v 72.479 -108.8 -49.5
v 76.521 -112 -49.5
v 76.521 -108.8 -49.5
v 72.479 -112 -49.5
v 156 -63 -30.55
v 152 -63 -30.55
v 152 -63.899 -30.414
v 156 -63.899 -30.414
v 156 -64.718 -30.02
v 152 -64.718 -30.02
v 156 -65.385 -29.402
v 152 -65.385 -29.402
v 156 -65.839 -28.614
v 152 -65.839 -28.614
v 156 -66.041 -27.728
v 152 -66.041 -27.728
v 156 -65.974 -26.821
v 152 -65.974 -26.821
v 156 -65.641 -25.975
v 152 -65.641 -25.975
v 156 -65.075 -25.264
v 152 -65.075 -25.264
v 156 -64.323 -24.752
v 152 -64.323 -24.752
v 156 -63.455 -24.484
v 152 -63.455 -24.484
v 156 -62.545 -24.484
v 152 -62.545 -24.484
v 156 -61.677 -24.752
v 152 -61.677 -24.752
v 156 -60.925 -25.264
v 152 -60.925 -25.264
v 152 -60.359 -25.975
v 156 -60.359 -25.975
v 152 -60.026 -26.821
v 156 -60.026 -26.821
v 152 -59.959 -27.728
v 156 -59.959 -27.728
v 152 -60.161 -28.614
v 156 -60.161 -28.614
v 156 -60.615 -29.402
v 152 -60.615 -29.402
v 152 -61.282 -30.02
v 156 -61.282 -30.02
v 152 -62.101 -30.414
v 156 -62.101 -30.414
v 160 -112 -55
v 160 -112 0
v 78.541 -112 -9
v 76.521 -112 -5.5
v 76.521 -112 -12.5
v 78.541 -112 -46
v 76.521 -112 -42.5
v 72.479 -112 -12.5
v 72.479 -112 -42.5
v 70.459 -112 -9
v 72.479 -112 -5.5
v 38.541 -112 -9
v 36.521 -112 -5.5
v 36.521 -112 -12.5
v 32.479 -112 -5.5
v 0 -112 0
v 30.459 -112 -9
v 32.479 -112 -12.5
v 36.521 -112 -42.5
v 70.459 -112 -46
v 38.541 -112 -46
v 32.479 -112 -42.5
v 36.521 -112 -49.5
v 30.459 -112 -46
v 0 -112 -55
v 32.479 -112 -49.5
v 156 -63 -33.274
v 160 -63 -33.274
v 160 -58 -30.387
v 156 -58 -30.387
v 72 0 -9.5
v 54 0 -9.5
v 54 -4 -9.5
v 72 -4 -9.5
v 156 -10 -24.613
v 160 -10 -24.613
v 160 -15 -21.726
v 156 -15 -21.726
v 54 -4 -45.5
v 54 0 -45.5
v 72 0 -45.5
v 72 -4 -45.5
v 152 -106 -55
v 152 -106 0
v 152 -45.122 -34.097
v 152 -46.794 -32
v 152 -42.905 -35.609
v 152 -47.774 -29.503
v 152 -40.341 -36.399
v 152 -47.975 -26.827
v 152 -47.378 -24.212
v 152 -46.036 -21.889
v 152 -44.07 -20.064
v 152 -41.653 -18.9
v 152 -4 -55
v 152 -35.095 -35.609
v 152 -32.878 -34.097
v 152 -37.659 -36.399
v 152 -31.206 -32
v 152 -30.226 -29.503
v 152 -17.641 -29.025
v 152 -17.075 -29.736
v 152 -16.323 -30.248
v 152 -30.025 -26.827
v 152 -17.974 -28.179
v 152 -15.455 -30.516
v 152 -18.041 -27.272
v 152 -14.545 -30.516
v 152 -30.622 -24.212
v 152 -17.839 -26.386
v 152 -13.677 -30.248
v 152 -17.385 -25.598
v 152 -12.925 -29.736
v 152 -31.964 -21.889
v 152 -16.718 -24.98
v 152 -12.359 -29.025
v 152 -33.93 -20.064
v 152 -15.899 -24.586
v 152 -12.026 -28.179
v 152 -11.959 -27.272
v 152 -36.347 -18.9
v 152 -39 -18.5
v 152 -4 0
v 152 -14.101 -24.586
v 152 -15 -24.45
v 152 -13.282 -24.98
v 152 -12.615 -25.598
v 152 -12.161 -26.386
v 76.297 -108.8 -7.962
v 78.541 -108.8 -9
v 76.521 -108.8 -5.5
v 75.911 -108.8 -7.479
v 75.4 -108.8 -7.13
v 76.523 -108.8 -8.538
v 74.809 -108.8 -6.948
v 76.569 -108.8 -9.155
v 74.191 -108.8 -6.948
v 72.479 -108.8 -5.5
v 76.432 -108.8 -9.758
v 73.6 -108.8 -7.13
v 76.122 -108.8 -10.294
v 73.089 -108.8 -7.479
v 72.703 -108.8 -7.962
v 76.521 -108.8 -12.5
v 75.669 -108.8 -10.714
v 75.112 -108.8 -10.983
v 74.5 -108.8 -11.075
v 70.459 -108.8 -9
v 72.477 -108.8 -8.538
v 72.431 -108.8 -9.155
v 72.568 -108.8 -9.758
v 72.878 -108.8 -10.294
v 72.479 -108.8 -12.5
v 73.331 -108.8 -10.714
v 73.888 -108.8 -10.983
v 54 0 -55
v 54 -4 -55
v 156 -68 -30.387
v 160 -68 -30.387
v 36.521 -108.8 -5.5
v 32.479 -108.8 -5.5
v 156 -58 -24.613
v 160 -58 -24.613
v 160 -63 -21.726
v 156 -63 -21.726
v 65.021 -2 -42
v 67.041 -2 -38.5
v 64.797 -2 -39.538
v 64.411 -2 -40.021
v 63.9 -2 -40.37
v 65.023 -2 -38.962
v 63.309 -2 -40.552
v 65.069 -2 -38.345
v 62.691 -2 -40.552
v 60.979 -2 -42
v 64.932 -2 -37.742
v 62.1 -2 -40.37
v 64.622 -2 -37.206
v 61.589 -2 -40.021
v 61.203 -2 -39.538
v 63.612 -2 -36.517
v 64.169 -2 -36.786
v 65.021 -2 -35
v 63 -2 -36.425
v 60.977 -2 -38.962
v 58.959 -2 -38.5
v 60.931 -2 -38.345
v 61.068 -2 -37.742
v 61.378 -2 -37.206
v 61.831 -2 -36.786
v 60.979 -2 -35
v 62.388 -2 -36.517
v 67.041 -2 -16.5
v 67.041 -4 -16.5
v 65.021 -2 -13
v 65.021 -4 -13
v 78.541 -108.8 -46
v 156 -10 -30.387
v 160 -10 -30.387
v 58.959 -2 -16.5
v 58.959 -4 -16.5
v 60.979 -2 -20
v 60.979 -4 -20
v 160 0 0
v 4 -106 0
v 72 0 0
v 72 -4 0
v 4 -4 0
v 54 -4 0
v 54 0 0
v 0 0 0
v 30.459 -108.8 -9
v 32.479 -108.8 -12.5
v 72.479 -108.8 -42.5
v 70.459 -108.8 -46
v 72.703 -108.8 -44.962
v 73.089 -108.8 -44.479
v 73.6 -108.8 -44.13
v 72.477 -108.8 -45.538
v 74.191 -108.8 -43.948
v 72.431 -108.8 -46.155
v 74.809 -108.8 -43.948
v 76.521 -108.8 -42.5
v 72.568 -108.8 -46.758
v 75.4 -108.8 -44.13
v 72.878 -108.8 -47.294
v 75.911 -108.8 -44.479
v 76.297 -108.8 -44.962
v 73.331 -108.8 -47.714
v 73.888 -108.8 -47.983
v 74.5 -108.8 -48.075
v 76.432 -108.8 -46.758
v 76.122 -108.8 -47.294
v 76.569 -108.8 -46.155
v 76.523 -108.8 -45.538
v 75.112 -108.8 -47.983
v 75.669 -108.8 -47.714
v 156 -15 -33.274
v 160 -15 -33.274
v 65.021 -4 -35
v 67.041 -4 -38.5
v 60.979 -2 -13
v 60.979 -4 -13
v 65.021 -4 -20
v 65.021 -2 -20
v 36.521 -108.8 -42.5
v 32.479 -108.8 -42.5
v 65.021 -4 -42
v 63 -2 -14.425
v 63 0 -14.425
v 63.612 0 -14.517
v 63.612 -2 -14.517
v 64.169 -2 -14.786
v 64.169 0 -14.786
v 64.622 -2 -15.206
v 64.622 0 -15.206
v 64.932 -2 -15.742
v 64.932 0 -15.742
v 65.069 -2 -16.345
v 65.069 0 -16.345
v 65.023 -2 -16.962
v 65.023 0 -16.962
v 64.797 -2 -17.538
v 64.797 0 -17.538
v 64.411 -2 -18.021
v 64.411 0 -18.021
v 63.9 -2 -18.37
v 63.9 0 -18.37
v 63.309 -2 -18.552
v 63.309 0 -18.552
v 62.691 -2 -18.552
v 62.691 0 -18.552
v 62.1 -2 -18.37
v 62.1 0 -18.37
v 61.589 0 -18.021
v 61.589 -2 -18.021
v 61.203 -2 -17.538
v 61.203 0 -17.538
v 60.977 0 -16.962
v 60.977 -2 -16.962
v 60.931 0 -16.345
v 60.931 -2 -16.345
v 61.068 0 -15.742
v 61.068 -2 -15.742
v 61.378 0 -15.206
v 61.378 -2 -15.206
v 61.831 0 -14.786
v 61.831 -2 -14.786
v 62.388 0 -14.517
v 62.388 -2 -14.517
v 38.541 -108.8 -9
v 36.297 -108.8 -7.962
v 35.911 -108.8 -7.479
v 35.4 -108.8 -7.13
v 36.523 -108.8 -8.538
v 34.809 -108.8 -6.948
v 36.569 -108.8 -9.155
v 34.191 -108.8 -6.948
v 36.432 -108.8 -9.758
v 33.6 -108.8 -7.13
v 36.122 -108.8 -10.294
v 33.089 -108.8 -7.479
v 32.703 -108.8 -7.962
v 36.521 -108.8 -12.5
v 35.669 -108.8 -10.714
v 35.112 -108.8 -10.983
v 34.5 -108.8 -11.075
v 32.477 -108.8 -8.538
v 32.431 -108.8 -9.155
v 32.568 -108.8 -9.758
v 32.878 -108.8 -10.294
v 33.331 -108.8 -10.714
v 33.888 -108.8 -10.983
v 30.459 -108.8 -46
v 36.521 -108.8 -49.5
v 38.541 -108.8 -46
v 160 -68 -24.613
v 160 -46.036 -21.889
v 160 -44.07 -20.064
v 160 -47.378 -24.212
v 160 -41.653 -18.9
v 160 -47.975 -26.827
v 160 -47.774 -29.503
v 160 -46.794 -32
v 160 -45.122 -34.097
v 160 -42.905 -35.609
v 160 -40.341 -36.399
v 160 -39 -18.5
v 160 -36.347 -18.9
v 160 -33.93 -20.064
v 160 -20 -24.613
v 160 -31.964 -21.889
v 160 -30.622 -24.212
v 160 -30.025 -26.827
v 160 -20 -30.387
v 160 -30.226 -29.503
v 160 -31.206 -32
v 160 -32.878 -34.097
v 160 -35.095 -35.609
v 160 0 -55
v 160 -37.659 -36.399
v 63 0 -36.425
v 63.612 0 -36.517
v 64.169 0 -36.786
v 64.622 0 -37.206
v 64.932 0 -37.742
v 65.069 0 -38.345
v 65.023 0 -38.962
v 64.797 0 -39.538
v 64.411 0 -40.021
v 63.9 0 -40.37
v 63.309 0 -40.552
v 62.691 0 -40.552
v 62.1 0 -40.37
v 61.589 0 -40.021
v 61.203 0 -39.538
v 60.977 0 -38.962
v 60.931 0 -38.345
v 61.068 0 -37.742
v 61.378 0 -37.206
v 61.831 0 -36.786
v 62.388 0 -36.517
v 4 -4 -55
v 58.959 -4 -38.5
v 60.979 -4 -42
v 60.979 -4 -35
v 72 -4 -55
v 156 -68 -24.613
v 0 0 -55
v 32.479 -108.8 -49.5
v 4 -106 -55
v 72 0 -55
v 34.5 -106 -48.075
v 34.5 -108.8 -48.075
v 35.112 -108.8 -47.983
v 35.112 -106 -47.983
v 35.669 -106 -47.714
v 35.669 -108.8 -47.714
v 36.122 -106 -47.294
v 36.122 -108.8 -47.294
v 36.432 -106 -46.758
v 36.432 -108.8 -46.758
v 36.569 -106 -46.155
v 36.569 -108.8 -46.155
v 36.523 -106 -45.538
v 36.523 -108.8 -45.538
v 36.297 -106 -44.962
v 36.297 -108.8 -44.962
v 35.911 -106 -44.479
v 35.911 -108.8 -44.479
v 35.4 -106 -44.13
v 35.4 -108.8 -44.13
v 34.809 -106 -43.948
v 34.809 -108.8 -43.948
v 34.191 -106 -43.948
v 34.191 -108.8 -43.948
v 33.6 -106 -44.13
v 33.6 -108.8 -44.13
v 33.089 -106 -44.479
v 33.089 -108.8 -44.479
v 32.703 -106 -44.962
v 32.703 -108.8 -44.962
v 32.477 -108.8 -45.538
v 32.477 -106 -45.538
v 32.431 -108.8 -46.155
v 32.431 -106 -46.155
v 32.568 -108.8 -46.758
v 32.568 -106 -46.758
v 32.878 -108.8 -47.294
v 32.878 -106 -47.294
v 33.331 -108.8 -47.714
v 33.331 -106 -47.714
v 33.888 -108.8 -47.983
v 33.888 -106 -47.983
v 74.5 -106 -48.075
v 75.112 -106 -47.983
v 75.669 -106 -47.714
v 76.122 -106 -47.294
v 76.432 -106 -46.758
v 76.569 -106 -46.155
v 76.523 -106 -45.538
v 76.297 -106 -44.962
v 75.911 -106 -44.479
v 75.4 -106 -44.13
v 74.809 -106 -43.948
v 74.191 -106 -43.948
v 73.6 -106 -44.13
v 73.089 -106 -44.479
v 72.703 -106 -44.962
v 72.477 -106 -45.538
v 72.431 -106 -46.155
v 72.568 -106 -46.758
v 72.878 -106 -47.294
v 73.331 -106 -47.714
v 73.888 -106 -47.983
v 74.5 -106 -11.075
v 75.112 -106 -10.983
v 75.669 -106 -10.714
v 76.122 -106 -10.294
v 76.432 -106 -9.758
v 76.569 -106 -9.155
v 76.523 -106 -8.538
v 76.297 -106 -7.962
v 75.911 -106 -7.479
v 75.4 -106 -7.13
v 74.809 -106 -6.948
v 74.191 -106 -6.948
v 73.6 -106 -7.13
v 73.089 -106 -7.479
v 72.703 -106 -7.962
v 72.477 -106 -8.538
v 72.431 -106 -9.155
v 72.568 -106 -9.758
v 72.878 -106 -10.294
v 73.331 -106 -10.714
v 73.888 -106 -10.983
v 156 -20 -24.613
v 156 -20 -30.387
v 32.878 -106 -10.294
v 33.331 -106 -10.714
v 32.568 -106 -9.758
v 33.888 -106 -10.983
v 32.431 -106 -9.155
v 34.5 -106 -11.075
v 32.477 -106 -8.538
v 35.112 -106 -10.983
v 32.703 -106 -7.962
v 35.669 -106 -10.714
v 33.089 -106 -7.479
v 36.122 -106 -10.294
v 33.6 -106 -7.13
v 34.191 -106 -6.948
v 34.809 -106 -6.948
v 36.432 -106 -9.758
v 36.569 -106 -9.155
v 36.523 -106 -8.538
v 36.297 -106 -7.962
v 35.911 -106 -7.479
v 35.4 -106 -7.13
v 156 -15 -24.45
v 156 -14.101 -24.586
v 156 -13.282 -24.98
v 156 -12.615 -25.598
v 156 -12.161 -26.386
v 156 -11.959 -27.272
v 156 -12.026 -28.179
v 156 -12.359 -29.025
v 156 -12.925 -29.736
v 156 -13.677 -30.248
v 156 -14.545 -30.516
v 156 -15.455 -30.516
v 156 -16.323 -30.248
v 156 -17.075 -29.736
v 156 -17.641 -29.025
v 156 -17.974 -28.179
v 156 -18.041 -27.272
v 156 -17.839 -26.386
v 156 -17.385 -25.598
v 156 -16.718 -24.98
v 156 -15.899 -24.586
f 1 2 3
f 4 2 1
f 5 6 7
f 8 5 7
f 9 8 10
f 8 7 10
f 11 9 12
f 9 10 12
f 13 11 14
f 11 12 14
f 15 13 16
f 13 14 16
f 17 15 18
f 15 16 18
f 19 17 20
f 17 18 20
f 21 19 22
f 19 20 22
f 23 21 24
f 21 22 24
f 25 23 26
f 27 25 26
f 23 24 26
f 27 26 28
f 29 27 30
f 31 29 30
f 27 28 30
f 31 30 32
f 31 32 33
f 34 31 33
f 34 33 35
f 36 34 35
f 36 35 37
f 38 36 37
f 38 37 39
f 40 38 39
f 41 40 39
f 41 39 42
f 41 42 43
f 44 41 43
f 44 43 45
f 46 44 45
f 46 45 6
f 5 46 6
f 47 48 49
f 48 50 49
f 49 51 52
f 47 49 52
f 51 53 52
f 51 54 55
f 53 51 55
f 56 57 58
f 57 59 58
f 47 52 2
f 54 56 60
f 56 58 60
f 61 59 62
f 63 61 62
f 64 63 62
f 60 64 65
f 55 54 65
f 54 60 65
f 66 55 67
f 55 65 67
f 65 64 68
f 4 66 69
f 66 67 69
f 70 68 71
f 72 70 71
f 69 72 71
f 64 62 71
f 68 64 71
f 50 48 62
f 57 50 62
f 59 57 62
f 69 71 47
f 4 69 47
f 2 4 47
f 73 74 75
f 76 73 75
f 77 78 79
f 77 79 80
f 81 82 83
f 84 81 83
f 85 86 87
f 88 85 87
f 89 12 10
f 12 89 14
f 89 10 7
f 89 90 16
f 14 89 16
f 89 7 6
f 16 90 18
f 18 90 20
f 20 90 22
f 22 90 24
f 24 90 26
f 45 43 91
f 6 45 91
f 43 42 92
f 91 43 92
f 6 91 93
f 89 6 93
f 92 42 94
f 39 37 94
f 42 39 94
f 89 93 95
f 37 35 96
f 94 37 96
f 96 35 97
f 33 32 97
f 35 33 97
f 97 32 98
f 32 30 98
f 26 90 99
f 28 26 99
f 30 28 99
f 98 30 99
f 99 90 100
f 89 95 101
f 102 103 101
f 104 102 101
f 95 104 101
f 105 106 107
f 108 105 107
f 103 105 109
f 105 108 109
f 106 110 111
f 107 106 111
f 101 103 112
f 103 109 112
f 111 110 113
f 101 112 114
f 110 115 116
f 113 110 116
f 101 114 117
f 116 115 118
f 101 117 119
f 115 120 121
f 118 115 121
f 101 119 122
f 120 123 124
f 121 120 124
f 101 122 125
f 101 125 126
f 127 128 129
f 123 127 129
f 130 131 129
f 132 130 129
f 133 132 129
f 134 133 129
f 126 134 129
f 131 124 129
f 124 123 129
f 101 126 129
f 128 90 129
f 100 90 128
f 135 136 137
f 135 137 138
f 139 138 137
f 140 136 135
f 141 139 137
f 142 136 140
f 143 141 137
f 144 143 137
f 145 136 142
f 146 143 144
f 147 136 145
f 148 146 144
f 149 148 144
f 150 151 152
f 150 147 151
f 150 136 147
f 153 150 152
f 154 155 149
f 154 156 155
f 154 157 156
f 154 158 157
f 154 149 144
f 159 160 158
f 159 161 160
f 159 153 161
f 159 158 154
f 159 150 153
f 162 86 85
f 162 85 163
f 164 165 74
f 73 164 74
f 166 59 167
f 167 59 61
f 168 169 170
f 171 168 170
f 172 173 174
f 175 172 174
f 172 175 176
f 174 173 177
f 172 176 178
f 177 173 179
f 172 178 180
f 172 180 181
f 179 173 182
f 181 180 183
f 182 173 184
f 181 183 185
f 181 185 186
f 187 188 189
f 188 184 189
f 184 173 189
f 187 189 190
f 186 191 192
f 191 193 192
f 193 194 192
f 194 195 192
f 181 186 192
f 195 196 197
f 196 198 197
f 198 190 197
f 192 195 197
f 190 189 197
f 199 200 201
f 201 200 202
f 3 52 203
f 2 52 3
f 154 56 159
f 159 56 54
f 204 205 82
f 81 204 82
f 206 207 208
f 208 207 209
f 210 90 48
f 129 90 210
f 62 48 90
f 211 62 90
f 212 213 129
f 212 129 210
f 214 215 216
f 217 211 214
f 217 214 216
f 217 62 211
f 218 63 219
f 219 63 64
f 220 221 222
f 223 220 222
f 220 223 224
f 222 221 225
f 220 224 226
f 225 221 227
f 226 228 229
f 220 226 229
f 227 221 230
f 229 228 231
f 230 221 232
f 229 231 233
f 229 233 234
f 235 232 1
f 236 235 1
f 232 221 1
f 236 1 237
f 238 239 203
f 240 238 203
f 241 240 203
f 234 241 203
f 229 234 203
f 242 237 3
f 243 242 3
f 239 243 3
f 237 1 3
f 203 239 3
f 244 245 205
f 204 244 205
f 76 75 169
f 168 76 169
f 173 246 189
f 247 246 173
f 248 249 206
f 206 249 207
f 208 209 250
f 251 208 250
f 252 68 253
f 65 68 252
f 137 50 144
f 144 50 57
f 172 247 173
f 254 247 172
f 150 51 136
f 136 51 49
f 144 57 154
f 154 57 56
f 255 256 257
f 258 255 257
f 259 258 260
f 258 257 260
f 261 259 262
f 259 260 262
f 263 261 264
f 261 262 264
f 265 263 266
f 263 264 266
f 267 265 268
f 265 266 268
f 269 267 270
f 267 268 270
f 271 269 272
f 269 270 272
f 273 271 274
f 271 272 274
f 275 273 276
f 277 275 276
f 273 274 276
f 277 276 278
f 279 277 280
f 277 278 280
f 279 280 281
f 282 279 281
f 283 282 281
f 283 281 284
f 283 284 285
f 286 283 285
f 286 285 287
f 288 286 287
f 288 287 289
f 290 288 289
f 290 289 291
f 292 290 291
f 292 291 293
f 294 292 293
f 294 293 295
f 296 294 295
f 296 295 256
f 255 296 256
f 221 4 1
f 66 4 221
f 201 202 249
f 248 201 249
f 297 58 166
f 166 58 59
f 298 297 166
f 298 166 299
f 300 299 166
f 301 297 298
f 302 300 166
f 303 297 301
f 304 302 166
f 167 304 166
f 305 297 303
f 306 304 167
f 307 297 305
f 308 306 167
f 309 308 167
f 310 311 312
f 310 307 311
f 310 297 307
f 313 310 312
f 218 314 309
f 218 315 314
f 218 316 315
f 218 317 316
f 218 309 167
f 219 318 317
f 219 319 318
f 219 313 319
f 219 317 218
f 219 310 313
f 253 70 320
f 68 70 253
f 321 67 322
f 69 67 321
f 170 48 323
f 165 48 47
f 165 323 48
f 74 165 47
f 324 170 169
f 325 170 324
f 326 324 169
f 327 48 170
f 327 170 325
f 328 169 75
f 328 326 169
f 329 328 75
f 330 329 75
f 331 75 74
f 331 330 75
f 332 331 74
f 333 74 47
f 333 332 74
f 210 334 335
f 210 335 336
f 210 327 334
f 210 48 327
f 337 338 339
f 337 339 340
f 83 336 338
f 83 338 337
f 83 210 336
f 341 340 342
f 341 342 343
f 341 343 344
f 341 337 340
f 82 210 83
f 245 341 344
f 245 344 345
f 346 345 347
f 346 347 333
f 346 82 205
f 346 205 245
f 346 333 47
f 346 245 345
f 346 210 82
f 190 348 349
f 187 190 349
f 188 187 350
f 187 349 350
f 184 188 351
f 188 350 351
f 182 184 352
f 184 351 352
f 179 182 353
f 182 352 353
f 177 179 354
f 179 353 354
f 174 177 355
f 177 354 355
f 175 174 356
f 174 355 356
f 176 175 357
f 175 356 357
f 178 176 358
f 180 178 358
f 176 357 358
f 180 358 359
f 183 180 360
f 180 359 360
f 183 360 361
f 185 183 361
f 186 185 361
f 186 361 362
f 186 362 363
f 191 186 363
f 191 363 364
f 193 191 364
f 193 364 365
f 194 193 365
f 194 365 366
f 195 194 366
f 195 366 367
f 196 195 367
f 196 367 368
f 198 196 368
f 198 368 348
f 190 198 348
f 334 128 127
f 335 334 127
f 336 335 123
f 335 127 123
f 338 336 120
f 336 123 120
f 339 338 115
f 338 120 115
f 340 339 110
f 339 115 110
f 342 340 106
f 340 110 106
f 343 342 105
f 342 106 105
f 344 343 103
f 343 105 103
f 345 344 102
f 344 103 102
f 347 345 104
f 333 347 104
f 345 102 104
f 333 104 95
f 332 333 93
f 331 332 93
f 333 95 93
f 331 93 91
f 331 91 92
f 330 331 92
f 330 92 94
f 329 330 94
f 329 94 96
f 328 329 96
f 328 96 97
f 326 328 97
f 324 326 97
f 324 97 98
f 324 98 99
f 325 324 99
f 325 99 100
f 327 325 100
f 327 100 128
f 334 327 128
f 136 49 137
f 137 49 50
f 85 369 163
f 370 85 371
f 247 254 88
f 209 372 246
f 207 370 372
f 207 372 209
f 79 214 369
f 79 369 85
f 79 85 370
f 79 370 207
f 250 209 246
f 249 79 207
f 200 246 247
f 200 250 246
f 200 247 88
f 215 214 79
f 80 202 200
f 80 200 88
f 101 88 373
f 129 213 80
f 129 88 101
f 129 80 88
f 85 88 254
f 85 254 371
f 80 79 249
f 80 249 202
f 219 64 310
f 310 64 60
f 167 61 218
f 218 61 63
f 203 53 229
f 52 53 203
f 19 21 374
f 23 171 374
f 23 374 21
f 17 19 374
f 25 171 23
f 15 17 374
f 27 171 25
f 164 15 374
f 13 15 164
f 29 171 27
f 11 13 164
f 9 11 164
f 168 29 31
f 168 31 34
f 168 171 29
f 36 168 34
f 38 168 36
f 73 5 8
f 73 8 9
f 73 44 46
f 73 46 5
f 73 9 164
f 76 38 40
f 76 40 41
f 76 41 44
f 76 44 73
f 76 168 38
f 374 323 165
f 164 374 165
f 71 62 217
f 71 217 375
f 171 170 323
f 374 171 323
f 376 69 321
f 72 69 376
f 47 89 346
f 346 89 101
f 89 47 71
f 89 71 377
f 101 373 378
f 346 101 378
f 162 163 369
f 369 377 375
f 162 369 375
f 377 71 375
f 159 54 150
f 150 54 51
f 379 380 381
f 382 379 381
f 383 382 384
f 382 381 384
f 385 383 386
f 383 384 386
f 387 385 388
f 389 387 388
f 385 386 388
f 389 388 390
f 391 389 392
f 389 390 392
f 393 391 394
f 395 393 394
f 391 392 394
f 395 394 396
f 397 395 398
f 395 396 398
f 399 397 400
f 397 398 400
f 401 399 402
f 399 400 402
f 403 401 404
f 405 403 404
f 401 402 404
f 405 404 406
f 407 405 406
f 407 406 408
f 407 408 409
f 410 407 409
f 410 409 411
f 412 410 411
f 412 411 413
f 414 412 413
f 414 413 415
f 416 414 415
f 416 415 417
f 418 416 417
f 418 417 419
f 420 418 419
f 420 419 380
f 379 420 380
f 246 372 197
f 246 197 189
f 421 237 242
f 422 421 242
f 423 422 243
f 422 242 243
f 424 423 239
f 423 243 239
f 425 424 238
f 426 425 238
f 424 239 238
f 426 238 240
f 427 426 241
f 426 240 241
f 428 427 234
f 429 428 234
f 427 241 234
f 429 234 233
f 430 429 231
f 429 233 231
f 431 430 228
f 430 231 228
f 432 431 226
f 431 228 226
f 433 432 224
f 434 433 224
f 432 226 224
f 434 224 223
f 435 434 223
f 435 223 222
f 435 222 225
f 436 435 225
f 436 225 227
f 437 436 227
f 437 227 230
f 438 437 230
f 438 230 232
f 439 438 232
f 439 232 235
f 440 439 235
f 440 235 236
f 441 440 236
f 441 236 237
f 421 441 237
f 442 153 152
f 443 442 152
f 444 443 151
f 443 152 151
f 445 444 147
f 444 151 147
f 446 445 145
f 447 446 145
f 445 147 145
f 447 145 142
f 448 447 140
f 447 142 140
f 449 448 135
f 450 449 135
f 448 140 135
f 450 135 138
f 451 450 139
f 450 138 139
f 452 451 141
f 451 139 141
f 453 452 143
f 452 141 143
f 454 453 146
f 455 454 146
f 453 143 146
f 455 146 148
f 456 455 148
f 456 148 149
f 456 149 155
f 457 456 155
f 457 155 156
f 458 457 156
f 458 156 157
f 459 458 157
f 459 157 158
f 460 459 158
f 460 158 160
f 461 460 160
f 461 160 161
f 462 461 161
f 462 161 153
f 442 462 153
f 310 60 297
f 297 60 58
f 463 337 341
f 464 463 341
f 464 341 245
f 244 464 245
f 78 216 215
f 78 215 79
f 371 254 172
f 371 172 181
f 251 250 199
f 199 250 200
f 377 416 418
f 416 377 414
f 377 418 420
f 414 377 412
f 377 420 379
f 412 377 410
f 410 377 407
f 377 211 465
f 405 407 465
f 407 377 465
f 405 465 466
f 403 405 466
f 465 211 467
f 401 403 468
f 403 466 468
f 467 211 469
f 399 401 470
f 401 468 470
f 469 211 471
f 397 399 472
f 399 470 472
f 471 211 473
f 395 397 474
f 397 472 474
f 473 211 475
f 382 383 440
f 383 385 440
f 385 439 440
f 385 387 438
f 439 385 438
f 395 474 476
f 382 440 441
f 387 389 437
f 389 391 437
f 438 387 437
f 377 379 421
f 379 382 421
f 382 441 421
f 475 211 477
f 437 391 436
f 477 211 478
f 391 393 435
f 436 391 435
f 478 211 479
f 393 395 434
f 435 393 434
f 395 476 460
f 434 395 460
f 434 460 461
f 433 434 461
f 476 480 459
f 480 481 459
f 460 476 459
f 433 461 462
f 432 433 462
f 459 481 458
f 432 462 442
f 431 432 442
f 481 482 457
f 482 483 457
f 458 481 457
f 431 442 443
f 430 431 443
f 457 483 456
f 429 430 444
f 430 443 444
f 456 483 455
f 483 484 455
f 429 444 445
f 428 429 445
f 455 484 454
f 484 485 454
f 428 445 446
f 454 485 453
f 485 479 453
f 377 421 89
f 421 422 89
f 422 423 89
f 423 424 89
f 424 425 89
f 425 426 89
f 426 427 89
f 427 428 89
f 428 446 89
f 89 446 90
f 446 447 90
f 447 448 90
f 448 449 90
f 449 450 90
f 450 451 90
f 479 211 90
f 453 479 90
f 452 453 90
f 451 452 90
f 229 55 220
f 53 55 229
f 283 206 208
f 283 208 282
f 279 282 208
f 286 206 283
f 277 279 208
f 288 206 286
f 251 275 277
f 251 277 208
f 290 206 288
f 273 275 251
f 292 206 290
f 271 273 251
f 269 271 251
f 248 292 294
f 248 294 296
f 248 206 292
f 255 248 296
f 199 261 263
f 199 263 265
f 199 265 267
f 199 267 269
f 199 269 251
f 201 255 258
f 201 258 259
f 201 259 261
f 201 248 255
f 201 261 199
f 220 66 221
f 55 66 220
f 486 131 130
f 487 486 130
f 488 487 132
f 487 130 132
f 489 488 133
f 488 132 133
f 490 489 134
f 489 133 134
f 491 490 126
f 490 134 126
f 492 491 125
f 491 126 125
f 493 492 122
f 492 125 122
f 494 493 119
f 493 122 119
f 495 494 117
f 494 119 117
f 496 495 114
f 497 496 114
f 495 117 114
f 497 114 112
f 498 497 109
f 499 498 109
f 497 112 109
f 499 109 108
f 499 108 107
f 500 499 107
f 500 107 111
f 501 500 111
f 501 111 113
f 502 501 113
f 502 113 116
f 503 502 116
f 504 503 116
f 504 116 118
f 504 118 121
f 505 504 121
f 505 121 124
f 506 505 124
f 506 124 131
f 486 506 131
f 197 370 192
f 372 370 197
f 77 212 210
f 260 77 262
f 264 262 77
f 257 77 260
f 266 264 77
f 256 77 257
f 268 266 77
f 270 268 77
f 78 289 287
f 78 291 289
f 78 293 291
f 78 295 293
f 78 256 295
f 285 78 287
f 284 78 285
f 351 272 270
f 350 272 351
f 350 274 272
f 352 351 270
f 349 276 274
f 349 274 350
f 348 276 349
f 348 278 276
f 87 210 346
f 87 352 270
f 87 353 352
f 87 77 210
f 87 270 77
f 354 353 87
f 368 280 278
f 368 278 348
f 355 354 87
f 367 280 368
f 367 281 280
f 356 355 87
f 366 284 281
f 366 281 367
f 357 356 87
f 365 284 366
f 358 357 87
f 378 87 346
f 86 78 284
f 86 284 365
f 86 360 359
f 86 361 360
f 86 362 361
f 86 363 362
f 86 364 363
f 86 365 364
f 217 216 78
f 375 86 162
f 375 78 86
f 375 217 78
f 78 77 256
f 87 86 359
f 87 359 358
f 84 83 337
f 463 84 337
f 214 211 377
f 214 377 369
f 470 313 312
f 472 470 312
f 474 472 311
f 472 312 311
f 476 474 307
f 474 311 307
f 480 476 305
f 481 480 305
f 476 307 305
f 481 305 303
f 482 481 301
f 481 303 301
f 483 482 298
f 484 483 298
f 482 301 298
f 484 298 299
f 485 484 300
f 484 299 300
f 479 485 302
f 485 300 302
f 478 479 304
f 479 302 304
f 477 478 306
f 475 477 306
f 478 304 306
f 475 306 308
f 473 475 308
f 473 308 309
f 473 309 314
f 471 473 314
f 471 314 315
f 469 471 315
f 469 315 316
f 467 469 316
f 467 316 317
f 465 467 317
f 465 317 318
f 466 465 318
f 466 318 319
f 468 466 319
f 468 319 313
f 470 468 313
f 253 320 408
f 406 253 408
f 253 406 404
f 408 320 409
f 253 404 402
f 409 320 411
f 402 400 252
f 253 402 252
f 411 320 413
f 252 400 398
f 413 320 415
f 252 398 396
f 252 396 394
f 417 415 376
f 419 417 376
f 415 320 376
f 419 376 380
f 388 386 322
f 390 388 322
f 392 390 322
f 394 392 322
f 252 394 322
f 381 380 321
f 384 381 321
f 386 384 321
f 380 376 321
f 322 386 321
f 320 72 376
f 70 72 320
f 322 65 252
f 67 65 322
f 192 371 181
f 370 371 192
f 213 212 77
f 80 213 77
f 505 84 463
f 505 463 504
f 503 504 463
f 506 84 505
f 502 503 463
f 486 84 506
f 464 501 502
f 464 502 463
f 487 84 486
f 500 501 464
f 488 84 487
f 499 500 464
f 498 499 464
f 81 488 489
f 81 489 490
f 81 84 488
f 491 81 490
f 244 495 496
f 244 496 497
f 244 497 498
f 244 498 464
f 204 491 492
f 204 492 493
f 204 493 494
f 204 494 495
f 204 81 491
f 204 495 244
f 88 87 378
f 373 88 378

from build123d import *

# Parameters (mm, degrees)
SKETCH1_W           = 55
SKETCH1_H           = 112
BOSS_EXTRUDE1_DEPTH = 160
CUT_EXTRUDE1_REACH  = 204.901
SKETCH2_W           = 148
SKETCH2_H           = 102
CUT_EXTRUDE2_REACH  = 198.655
SKETCH3_R           = 9
SKETCH3_R_2         = 3.05
CUT_EXTRUDE4_DEPTH  = 4
CUT_EXTRUDE11_REACH = 204.901
SKETCH15_R          = 2.075
CUT_EXTRUDE12_DEPTH = 3.2
CUT_EXTRUDE14_REACH = 204.901
SKETCH17_W          = 18
SKETCH17_H          = 9.5
CUT_EXTRUDE15_REACH = 204.901
SKETCH19_R          = 2.075
CUT_EXTRUDE16_DEPTH = 2


with BuildPart() as part:
    # Sketch1 → Boss-Extrude1 (new body)
    with BuildSketch(Plane(origin=(0, 0, 0), x_dir=(0, 0, -1), z_dir=(1, 0, 0))):
        with Locations((27.5, -56)):
            Rectangle(SKETCH1_W, SKETCH1_H)
    extrude(amount=BOSS_EXTRUDE1_DEPTH)

    # Sketch2 → Cut-Extrude1 (cut, up to next)
    with BuildSketch(Plane.XY, mode=Mode.PRIVATE) as cut_extrude1_sk1:
        with Locations((78, -55)):
            Rectangle(SKETCH2_W, SKETCH2_H)
    cut_extrude1_tool1 = extrude(cut_extrude1_sk1.sketch, amount=-CUT_EXTRUDE1_REACH, mode=Mode.PRIVATE) & part.part
    add(cut_extrude1_tool1.solids().sort_by_distance((78, -55, 0))[0], mode=Mode.SUBTRACT)

    # Sketch3 → Cut-Extrude2 (cut, up to next)
    with BuildSketch(Plane.ZY.offset(-152), mode=Mode.PRIVATE) as cut_extrude2_sk1:
        with Locations((-27.5, -39)):
            Circle(SKETCH3_R)
    cut_extrude2_tool1 = extrude(cut_extrude2_sk1.sketch, amount=-CUT_EXTRUDE2_REACH, mode=Mode.PRIVATE) & part.part
    # Sketch3 → Cut-Extrude2 (cut, up to next)
    with BuildSketch(Plane.ZY.offset(-152), mode=Mode.PRIVATE) as cut_extrude2_sk2:
        with Locations((-27.5, -15)):
            Circle(SKETCH3_R_2)
    cut_extrude2_tool2 = extrude(cut_extrude2_sk2.sketch, amount=-CUT_EXTRUDE2_REACH, mode=Mode.PRIVATE) & part.part
    # Sketch3 → Cut-Extrude2 (cut, up to next)
    with BuildSketch(Plane.ZY.offset(-152), mode=Mode.PRIVATE) as cut_extrude2_sk3:
        with Locations(Location((-27.5, -63, 0), (0, 0, 180))):
            Circle(SKETCH3_R_2)
    cut_extrude2_tool3 = extrude(cut_extrude2_sk3.sketch, amount=-CUT_EXTRUDE2_REACH, mode=Mode.PRIVATE) & part.part
    add(cut_extrude2_tool1.solids().sort_by_distance((152, -39, -27.5))[0], mode=Mode.SUBTRACT)
    add(cut_extrude2_tool2.solids().sort_by_distance((152, -15, -27.5))[0], mode=Mode.SUBTRACT)
    add(cut_extrude2_tool3.solids().sort_by_distance((152, -63, -27.5))[0], mode=Mode.SUBTRACT)

    # Sketch6 → Cut-Extrude4 (cut)
    with BuildSketch(Plane(origin=(160, 0, 0), x_dir=(0, 0, -1), z_dir=(1, 0, 0))):
        Polygon((30.386751346, -20), (33.273502692, -15), (30.386751346, -10), (24.613248654, -10), (21.726497308, -15), (24.613248654, -20), align=None)
        Polygon((30.386751346, -68), (33.273502692, -63), (30.386751346, -58), (24.613248654, -58), (21.726497308, -63), (24.613248654, -68), align=None)
    extrude(amount=-CUT_EXTRUDE4_DEPTH, mode=Mode.SUBTRACT)

    # Sketch15 → Cut-Extrude11 (cut, up to next)
    with BuildSketch(Plane(origin=(0, -112, 0), x_dir=(-1, 0, 0), z_dir=(0, -1, 0)), mode=Mode.PRIVATE) as cut_extrude11_sk1:
        with Locations(Location((-34.5, 9, 0), (0, 0, 90))):
            Circle(SKETCH15_R)
    cut_extrude11_tool1 = extrude(cut_extrude11_sk1.sketch, amount=-CUT_EXTRUDE11_REACH, mode=Mode.PRIVATE) & part.part
    # Sketch15 → Cut-Extrude11 (cut, up to next)
    with BuildSketch(Plane(origin=(0, -112, 0), x_dir=(-1, 0, 0), z_dir=(0, -1, 0)), mode=Mode.PRIVATE) as cut_extrude11_sk2:
        with Locations(Location((-74.5, 9, 0), (0, 0, 90))):
            Circle(SKETCH15_R)
    cut_extrude11_tool2 = extrude(cut_extrude11_sk2.sketch, amount=-CUT_EXTRUDE11_REACH, mode=Mode.PRIVATE) & part.part
    # Sketch15 → Cut-Extrude11 (cut, up to next)
    with BuildSketch(Plane(origin=(0, -112, 0), x_dir=(-1, 0, 0), z_dir=(0, -1, 0)), mode=Mode.PRIVATE) as cut_extrude11_sk3:
        with Locations(Location((-74.5, 46, 0), (0, 0, 90))):
            Circle(SKETCH15_R)
    cut_extrude11_tool3 = extrude(cut_extrude11_sk3.sketch, amount=-CUT_EXTRUDE11_REACH, mode=Mode.PRIVATE) & part.part
    # Sketch15 → Cut-Extrude11 (cut, up to next)
    with BuildSketch(Plane(origin=(0, -112, 0), x_dir=(-1, 0, 0), z_dir=(0, -1, 0)), mode=Mode.PRIVATE) as cut_extrude11_sk4:
        with Locations(Location((-34.5, 46, 0), (0, 0, 90))):
            Circle(SKETCH15_R)
    cut_extrude11_tool4 = extrude(cut_extrude11_sk4.sketch, amount=-CUT_EXTRUDE11_REACH, mode=Mode.PRIVATE) & part.part
    add(cut_extrude11_tool1.solids().sort_by_distance((34.5, -112, -9))[0], mode=Mode.SUBTRACT)
    add(cut_extrude11_tool2.solids().sort_by_distance((74.5, -112, -9))[0], mode=Mode.SUBTRACT)
    add(cut_extrude11_tool3.solids().sort_by_distance((74.5, -112, -46))[0], mode=Mode.SUBTRACT)
    add(cut_extrude11_tool4.solids().sort_by_distance((34.5, -112, -46))[0], mode=Mode.SUBTRACT)

    # Sketch16 → Cut-Extrude12 (cut)
    with BuildSketch(Plane(origin=(0, -112, 0), x_dir=(-1, 0, 0), z_dir=(0, -1, 0))):
        Polygon((-38.541451884, 9), (-36.520725942, 5.5), (-32.479274058, 5.5), (-30.458548116, 9), (-32.479274058, 12.5), (-36.520725942, 12.5), align=None)
        Polygon((-76.520725942, 12.5), (-78.541451884, 9), (-76.520725942, 5.5), (-72.479274058, 5.5), (-70.458548116, 9), (-72.479274058, 12.5), align=None)
        Polygon((-72.479274058, 42.5), (-76.520725942, 42.5), (-78.541451884, 46), (-76.520725942, 49.5), (-72.479274058, 49.5), (-70.458548116, 46), align=None)
        Polygon((-36.520725942, 42.5), (-38.541451884, 46), (-36.520725942, 49.5), (-32.479274058, 49.5), (-30.458548116, 46), (-32.479274058, 42.5), align=None)
    extrude(amount=-CUT_EXTRUDE12_DEPTH, mode=Mode.SUBTRACT)

    # Sketch17 → Cut-Extrude14 (cut, up to next)
    with BuildSketch(Plane(origin=(0, 0, 0), x_dir=(1, 0, 0), z_dir=(0, 1, 0)), mode=Mode.PRIVATE) as cut_extrude14_sk1:
        with Locations((63, 50.25)):
            Rectangle(SKETCH17_W, SKETCH17_H)
    cut_extrude14_tool1 = extrude(cut_extrude14_sk1.sketch, amount=-CUT_EXTRUDE14_REACH, mode=Mode.PRIVATE) & part.part
    # Sketch17 → Cut-Extrude14 (cut, up to next)
    with BuildSketch(Plane(origin=(0, 0, 0), x_dir=(1, 0, 0), z_dir=(0, 1, 0)), mode=Mode.PRIVATE) as cut_extrude14_sk2:
        with Locations((63, 4.75)):
            Rectangle(SKETCH17_W, SKETCH17_H)
    cut_extrude14_tool2 = extrude(cut_extrude14_sk2.sketch, amount=-CUT_EXTRUDE14_REACH, mode=Mode.PRIVATE) & part.part
    add(cut_extrude14_tool1.solids().sort_by_distance((63, 0, -50.25))[0], mode=Mode.SUBTRACT)
    add(cut_extrude14_tool2.solids().sort_by_distance((63, 0, -4.75))[0], mode=Mode.SUBTRACT)

    # Sketch19 → Cut-Extrude15 (cut, up to next)
    with BuildSketch(Plane(origin=(0, 0, 0), x_dir=(1, 0, 0), z_dir=(0, 1, 0)), mode=Mode.PRIVATE) as cut_extrude15_sk1:
        with Locations(Location((63, 38.5, 0), (0, 0, 270))):
            Circle(SKETCH19_R)
    cut_extrude15_tool1 = extrude(cut_extrude15_sk1.sketch, amount=-CUT_EXTRUDE15_REACH, mode=Mode.PRIVATE) & part.part
    # Sketch19 → Cut-Extrude15 (cut, up to next)
    with BuildSketch(Plane(origin=(0, 0, 0), x_dir=(1, 0, 0), z_dir=(0, 1, 0)), mode=Mode.PRIVATE) as cut_extrude15_sk2:
        with Locations(Location((63, 16.5, 0), (0, 0, 270))):
            Circle(SKETCH19_R)
    cut_extrude15_tool2 = extrude(cut_extrude15_sk2.sketch, amount=-CUT_EXTRUDE15_REACH, mode=Mode.PRIVATE) & part.part
    add(cut_extrude15_tool1.solids().sort_by_distance((63, 0, -38.5))[0], mode=Mode.SUBTRACT)
    add(cut_extrude15_tool2.solids().sort_by_distance((63, 0, -16.5))[0], mode=Mode.SUBTRACT)

    # Sketch20 → Cut-Extrude16 (cut)
    with BuildSketch(Plane.XZ.offset(4)):
        Polygon((67.041451884, -16.5), (65.020725942, -13), (60.979274058, -13), (58.958548116, -16.5), (60.979274058, -20), (65.020725942, -20), align=None)
        Polygon((65.020725942, -35), (67.041451884, -38.5), (65.020725942, -42), (60.979274058, -42), (58.958548116, -38.5), (60.979274058, -35), align=None)
    extrude(amount=-CUT_EXTRUDE16_DEPTH, mode=Mode.SUBTRACT)


solid = part.part
